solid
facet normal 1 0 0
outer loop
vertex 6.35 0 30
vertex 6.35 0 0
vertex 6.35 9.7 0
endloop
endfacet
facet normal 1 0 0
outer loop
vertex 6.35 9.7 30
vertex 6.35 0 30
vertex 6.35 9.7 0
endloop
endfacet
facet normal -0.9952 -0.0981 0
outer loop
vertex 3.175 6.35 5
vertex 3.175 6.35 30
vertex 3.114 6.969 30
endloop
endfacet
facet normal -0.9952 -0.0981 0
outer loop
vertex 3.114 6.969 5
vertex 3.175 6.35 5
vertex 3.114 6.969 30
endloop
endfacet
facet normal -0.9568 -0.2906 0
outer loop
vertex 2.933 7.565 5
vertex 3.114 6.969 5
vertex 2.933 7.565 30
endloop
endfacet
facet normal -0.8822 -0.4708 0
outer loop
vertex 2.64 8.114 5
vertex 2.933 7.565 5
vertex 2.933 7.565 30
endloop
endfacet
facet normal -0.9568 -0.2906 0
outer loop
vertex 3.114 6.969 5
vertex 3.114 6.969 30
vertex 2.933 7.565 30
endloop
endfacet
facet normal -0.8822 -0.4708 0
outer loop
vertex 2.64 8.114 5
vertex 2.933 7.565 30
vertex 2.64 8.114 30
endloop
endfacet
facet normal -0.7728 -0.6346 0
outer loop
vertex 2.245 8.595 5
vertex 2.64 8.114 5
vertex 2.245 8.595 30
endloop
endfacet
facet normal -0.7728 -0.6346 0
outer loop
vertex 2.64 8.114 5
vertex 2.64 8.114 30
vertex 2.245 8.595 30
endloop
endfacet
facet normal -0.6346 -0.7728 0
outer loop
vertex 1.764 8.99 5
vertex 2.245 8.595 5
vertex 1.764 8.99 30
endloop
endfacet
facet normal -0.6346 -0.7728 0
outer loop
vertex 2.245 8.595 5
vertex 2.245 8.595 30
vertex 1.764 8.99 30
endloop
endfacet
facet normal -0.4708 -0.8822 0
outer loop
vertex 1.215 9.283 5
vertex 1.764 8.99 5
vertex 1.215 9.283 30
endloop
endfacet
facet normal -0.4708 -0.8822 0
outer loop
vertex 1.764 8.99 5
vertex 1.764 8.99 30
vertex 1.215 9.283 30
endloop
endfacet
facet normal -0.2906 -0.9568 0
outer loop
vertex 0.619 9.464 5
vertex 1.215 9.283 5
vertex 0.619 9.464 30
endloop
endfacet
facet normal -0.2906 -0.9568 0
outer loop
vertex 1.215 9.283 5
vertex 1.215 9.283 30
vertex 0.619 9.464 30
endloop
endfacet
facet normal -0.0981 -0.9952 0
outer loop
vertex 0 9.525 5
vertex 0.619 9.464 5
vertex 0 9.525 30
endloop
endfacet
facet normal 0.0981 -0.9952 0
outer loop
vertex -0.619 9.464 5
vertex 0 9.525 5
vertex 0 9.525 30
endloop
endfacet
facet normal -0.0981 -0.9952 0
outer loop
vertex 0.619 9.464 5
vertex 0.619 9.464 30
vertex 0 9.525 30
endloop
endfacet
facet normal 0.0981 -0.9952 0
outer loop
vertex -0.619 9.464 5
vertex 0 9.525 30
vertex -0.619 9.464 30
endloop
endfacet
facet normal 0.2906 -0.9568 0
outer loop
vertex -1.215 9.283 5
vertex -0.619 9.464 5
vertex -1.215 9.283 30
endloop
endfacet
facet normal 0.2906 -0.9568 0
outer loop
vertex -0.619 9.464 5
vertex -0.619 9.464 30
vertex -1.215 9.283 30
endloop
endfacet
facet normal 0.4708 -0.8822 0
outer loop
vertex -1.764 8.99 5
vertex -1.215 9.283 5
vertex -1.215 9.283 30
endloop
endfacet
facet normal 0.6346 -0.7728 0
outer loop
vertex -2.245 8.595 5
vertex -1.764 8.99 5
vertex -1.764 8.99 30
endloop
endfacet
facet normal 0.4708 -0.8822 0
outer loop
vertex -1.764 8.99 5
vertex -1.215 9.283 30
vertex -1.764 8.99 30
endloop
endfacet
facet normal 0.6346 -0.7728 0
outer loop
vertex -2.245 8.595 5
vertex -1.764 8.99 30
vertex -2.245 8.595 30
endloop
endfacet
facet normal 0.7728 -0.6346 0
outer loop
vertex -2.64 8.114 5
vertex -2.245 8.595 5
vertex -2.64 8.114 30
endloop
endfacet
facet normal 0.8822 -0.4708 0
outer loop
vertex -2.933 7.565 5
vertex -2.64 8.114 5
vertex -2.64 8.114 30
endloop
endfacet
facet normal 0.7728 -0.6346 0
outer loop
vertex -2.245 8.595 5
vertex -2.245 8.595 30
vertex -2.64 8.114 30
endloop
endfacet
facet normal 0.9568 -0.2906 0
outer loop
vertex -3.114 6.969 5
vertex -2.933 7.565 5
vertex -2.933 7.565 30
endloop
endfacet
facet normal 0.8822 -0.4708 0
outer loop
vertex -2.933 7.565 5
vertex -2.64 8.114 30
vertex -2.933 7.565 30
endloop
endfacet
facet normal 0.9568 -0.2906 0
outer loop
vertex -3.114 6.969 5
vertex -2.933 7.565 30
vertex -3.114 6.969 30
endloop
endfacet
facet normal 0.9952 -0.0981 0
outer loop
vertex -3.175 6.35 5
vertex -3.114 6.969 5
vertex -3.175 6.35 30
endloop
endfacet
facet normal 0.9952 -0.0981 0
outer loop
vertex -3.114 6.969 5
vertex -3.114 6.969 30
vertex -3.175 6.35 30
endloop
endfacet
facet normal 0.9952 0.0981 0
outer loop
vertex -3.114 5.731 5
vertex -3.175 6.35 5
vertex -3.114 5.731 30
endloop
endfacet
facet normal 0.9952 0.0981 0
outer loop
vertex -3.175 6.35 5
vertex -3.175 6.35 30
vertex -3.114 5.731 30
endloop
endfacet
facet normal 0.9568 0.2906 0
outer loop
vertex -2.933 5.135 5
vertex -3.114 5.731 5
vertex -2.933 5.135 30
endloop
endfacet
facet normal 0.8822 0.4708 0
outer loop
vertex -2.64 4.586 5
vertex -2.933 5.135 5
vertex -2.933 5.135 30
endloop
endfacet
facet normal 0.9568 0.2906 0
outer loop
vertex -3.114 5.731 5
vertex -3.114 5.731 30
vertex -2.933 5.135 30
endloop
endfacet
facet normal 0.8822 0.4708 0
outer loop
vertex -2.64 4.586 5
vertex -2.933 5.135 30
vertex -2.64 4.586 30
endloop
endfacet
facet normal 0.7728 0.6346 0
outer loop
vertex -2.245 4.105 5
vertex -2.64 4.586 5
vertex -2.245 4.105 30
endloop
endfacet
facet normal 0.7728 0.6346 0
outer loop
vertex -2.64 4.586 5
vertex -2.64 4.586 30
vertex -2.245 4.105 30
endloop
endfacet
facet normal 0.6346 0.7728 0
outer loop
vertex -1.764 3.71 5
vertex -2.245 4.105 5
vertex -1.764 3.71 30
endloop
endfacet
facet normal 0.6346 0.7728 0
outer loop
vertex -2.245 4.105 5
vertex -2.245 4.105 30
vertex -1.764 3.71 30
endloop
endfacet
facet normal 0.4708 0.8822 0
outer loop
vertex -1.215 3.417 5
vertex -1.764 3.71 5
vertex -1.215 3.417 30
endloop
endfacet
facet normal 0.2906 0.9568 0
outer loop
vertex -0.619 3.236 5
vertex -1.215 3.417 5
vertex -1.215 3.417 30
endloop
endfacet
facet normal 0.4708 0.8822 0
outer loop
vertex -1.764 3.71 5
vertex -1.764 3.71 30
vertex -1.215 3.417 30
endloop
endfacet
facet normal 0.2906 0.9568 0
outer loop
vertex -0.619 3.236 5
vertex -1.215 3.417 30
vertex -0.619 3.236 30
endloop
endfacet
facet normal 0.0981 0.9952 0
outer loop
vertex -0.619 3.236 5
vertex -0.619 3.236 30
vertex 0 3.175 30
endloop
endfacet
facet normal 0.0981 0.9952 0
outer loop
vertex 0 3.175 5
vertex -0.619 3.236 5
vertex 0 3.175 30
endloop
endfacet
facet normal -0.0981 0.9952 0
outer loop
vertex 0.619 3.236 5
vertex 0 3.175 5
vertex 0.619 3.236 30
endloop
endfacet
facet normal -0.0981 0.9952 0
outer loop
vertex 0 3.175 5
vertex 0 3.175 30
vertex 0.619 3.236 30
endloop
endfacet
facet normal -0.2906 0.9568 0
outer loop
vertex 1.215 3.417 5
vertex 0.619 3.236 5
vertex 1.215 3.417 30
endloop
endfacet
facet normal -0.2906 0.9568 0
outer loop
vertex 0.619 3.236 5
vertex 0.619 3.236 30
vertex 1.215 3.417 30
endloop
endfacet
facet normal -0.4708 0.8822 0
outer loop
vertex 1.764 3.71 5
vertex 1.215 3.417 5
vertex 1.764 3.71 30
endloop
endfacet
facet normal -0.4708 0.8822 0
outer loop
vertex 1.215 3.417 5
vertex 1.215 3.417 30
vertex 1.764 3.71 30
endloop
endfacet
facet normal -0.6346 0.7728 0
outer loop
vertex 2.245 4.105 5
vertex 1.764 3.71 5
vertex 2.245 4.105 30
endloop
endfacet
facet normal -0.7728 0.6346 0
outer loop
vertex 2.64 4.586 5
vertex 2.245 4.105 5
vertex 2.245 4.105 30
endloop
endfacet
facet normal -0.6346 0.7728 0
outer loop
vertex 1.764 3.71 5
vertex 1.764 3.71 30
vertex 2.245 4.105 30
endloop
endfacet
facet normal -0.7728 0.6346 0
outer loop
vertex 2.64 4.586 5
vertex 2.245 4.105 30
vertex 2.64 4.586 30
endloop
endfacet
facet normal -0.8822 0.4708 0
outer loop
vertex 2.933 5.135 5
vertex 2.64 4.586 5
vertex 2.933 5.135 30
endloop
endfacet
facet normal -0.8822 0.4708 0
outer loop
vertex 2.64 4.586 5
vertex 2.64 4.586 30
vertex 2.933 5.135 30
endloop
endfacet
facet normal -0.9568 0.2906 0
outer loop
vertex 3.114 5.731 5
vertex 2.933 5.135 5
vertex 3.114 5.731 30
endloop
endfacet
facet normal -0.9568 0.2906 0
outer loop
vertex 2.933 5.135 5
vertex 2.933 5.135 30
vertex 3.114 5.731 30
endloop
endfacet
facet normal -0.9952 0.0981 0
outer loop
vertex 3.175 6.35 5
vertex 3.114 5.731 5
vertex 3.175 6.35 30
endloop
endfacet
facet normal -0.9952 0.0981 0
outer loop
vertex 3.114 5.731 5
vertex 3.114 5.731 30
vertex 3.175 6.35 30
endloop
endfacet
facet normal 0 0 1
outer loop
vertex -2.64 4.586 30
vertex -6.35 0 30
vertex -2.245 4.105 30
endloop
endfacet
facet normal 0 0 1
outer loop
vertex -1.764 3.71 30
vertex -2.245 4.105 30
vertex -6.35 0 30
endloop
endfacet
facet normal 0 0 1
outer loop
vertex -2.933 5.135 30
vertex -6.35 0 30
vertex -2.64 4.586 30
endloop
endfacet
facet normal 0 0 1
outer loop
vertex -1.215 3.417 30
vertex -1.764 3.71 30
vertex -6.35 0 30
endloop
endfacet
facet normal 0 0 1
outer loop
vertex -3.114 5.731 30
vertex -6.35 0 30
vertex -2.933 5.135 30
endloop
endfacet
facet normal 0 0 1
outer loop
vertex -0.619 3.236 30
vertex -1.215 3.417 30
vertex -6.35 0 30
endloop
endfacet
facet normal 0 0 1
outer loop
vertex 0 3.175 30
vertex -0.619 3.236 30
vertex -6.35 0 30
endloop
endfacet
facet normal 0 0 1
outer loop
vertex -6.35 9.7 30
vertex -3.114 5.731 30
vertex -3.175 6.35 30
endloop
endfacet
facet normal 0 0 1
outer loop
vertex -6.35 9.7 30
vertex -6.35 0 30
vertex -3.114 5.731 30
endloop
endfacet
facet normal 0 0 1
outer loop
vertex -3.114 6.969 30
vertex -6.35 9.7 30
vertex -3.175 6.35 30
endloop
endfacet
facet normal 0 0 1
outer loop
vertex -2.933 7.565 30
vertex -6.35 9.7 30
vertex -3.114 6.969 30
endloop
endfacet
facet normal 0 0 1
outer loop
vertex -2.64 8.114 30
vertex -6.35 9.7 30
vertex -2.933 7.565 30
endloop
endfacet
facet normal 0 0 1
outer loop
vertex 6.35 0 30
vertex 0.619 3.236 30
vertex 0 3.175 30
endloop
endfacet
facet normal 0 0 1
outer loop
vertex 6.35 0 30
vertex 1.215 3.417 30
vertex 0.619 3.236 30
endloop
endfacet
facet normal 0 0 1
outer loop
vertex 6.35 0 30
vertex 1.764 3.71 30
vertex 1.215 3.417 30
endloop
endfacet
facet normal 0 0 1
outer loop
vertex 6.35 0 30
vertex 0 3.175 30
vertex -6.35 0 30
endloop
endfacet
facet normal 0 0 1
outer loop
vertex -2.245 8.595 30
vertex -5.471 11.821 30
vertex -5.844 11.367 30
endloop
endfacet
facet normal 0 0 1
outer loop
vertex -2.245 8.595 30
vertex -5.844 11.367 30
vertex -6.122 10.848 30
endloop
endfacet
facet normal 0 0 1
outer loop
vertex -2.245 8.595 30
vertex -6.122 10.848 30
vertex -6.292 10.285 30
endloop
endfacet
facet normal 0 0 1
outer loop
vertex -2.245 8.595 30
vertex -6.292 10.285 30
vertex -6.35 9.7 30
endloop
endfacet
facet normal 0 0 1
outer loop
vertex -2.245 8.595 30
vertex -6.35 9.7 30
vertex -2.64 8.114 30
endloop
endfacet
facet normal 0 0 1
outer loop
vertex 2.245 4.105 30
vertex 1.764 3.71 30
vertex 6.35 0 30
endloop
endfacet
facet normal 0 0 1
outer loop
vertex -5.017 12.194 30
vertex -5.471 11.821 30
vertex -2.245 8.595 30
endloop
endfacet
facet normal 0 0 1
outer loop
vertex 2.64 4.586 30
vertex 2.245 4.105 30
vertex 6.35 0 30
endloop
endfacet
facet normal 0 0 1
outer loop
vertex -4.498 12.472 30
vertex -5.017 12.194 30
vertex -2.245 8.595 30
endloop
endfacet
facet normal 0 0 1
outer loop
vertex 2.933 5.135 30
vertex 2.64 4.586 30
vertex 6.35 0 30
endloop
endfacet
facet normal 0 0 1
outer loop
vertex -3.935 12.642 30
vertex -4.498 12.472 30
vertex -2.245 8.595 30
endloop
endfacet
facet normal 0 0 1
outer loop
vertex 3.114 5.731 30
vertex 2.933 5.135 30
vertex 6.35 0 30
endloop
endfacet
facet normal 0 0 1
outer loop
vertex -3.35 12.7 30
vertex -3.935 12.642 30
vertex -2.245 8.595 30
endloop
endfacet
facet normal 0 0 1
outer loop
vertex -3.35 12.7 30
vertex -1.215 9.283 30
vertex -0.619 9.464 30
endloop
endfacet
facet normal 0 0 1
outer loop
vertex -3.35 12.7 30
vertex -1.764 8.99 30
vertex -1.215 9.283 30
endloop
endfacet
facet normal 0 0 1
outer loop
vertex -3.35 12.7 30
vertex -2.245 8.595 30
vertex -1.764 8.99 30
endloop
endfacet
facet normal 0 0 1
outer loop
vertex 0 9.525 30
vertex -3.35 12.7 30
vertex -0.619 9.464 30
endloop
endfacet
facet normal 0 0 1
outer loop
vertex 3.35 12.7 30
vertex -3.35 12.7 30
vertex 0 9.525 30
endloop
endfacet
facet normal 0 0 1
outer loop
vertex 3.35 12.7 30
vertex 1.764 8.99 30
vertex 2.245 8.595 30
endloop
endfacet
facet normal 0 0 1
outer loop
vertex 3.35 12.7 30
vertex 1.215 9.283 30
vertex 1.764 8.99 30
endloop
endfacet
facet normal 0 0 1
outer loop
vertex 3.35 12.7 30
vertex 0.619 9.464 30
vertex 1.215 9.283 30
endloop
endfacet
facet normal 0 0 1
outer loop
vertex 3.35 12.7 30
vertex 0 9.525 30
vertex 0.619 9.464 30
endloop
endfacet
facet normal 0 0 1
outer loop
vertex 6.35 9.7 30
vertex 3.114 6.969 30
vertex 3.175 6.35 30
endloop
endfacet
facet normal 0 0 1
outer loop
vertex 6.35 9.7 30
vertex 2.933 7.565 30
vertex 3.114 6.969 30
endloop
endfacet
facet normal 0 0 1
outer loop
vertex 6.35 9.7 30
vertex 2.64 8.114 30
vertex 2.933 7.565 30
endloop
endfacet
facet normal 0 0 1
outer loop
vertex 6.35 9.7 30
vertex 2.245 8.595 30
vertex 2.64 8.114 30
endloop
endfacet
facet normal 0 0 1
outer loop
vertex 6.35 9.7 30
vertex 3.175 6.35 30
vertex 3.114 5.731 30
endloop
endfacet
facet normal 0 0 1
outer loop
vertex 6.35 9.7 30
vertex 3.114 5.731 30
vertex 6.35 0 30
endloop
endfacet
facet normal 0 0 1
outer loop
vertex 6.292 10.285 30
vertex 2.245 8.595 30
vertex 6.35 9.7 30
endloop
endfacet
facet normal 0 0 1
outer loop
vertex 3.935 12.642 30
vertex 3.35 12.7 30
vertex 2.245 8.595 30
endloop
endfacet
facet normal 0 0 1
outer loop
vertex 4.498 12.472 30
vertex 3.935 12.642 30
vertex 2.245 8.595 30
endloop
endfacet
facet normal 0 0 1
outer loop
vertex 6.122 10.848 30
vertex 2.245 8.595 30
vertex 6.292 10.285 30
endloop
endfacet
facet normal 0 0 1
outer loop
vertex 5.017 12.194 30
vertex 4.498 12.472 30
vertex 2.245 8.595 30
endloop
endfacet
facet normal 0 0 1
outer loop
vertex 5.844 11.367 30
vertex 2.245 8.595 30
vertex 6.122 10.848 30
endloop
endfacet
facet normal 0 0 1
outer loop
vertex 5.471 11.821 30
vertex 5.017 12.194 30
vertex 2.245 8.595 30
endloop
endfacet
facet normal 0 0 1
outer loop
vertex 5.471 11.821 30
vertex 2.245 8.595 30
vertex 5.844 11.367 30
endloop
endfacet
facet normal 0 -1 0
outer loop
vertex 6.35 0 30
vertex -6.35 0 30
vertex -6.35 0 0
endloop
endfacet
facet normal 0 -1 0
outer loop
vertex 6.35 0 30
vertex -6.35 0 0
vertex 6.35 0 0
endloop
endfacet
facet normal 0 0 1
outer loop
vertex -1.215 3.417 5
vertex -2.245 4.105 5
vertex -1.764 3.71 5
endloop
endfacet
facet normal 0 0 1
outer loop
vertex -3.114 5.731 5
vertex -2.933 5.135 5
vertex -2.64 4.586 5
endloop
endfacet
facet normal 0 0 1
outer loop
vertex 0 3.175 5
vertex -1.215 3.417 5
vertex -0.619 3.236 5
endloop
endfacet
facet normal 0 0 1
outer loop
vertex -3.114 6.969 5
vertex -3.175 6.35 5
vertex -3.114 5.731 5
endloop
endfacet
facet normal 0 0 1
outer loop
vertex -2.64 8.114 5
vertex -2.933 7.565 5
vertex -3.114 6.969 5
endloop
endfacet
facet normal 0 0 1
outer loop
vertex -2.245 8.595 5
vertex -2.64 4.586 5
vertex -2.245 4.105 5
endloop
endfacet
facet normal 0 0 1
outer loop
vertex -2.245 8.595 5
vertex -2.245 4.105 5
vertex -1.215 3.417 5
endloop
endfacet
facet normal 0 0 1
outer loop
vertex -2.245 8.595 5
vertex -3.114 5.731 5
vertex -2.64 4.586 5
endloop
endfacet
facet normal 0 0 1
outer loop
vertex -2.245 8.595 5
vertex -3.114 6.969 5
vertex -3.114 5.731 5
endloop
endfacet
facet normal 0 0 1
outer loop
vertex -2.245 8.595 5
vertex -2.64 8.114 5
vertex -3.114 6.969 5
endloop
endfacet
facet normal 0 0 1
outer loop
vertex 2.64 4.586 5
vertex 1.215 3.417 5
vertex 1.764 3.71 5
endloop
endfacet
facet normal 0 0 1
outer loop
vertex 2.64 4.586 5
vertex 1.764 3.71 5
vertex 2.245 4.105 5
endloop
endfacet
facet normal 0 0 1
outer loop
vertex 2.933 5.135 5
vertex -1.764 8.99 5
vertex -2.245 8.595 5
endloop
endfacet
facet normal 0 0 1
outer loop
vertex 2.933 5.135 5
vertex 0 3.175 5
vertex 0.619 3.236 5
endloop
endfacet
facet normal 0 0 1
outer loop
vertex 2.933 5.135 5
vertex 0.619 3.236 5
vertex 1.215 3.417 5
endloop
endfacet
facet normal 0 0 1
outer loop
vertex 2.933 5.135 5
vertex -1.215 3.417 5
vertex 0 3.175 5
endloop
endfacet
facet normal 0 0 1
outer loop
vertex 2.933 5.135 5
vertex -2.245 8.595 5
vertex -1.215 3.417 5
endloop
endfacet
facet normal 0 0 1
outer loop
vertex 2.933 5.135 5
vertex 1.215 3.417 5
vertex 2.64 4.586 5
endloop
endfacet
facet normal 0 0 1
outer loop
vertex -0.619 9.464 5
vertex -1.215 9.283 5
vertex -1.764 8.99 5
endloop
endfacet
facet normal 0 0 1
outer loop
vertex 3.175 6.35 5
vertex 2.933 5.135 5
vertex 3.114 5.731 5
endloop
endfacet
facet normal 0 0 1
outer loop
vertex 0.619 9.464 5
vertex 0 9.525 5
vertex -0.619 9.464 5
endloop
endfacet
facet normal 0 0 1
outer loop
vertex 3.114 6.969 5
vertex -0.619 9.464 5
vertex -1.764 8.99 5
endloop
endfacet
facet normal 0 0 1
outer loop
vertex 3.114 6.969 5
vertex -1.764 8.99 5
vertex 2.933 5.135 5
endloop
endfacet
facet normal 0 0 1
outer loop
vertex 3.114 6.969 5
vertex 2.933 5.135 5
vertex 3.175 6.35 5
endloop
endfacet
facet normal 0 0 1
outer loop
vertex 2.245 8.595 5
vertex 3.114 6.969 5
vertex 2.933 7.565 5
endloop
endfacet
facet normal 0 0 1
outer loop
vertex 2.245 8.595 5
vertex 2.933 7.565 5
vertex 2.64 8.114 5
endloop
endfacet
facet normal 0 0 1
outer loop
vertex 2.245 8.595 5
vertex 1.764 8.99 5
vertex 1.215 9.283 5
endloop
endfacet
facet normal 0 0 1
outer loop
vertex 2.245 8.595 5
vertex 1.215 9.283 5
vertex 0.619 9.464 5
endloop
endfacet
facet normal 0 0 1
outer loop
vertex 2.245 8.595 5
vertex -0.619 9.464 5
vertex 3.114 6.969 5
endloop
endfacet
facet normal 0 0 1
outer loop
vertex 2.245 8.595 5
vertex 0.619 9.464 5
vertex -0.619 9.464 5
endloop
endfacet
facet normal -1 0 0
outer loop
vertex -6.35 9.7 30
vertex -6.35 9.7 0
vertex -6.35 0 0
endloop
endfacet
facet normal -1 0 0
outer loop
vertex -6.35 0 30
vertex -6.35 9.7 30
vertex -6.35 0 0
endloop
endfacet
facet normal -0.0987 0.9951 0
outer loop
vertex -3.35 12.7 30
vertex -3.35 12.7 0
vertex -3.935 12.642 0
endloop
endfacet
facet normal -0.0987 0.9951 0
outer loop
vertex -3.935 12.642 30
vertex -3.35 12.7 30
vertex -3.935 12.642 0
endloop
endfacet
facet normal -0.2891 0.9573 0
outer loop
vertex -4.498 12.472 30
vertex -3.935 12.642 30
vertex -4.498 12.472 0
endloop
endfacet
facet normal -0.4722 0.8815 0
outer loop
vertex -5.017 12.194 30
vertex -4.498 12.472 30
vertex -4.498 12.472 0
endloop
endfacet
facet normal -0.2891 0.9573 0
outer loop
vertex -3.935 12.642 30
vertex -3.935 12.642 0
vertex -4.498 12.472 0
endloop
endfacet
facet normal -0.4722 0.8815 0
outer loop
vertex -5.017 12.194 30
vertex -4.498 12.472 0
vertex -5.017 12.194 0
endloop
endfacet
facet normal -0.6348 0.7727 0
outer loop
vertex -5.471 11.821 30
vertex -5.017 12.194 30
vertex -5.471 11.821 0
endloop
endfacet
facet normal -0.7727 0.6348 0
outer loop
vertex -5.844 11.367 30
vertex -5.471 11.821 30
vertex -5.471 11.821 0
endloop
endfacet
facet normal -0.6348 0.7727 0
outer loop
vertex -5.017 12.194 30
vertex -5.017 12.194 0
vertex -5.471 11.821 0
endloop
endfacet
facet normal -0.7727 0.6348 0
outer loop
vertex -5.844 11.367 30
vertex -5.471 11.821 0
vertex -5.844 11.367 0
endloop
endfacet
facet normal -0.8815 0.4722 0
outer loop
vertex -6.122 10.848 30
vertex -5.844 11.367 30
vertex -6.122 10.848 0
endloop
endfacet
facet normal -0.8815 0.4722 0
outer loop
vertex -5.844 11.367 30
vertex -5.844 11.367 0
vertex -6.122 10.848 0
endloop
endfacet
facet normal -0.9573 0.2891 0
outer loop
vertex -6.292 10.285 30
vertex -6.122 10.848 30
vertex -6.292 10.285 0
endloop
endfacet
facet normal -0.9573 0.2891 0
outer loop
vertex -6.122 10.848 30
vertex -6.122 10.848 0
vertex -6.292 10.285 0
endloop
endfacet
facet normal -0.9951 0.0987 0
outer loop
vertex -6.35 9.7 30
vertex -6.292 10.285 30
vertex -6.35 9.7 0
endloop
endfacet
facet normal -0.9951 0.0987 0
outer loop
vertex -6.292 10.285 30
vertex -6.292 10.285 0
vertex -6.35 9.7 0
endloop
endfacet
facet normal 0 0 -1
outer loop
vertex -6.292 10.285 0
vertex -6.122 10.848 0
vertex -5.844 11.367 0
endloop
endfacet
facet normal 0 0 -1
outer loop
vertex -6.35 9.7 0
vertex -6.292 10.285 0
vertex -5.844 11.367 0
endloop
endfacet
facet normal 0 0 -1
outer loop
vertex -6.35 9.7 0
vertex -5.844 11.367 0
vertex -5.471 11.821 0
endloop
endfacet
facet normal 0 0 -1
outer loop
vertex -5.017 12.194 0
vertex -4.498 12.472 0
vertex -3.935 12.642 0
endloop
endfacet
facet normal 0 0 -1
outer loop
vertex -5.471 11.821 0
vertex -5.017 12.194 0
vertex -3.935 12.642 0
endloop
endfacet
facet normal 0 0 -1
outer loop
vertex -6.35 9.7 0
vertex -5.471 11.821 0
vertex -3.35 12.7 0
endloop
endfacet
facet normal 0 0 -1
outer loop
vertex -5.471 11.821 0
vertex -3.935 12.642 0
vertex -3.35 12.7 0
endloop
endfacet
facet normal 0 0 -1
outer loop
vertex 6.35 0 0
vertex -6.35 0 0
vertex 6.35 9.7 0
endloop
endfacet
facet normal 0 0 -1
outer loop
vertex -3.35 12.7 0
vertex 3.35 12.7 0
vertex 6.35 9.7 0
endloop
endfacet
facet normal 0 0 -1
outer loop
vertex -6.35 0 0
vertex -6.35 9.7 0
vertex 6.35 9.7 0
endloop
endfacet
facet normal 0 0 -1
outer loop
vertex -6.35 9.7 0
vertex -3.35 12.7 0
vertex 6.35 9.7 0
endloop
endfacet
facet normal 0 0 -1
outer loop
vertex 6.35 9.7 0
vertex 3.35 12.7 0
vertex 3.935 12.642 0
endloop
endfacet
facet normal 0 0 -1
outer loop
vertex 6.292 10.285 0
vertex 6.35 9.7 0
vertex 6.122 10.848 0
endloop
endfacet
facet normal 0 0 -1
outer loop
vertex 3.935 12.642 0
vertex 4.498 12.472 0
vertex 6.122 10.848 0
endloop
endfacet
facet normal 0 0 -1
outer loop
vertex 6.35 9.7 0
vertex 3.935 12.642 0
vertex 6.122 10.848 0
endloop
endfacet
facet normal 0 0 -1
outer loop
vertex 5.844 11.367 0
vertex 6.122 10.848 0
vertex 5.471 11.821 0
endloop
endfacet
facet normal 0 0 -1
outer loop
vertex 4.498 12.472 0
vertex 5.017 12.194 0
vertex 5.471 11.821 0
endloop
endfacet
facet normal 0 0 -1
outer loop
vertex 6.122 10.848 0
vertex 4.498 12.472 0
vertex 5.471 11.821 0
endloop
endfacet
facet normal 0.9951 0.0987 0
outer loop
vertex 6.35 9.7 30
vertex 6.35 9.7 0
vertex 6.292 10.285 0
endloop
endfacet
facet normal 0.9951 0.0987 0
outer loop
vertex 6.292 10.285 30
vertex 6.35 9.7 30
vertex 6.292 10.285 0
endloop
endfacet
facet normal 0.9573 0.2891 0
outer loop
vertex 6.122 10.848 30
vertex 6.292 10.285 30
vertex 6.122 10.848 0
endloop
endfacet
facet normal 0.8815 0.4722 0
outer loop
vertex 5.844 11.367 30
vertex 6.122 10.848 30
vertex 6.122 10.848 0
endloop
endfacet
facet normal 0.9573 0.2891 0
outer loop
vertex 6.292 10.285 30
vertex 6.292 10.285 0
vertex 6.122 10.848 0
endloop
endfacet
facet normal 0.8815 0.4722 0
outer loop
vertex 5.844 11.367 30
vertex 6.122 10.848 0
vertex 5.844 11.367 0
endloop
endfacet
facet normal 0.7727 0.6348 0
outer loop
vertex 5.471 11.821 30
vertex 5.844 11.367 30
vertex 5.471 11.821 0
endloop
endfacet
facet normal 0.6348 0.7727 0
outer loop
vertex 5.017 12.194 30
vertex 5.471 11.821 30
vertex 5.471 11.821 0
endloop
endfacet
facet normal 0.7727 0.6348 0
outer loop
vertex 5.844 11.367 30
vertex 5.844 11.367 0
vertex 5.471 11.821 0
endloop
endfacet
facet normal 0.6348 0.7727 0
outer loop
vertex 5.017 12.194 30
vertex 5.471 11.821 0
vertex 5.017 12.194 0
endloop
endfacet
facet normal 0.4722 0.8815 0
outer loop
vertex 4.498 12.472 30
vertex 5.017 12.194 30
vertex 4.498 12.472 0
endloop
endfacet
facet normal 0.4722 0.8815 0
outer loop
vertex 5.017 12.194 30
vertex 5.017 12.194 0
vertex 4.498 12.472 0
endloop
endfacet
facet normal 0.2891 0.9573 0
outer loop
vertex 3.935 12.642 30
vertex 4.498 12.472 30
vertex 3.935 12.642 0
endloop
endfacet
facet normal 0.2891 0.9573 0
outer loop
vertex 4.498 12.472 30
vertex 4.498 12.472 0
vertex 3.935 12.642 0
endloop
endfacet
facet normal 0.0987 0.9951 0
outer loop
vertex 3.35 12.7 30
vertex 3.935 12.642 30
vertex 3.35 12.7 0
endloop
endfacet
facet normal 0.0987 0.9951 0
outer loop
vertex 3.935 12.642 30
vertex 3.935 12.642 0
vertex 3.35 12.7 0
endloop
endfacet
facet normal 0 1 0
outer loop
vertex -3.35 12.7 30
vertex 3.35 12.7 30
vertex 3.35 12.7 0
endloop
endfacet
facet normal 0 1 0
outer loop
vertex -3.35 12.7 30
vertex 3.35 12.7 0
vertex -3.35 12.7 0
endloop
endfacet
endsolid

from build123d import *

# Parameters (mm, degrees)
PAD_DEPTH    = 30
SKETCH001_R  = 3.175
POCKET_DEPTH = 25


with BuildPart() as part:
    # Sketch → Pad (new body)
    with BuildSketch(Plane.XY):
        with BuildLine():
            Line((-6.35, 0), (6.35, 0))
            Line((6.35, 0), (6.35, 9.7))
            ThreePointArc((6.35, 9.7), (5.47132, 11.82132), (3.35, 12.7))
            Line((3.35, 12.7), (-3.35, 12.7))
            ThreePointArc((-3.35, 12.7), (-5.47132, 11.82132), (-6.35, 9.7))
            Line((-6.35, 9.7), (-6.35, 0))
        make_face()
    extrude(amount=PAD_DEPTH)

    # Sketch001 (on Face8 of Pad) → Pocket (cut)
    with BuildSketch(Plane.XY.offset(30)):
        with Locations((0, 6.35)):
            Circle(SKETCH001_R)
    extrude(amount=-POCKET_DEPTH, mode=Mode.SUBTRACT)


solid = part.part
